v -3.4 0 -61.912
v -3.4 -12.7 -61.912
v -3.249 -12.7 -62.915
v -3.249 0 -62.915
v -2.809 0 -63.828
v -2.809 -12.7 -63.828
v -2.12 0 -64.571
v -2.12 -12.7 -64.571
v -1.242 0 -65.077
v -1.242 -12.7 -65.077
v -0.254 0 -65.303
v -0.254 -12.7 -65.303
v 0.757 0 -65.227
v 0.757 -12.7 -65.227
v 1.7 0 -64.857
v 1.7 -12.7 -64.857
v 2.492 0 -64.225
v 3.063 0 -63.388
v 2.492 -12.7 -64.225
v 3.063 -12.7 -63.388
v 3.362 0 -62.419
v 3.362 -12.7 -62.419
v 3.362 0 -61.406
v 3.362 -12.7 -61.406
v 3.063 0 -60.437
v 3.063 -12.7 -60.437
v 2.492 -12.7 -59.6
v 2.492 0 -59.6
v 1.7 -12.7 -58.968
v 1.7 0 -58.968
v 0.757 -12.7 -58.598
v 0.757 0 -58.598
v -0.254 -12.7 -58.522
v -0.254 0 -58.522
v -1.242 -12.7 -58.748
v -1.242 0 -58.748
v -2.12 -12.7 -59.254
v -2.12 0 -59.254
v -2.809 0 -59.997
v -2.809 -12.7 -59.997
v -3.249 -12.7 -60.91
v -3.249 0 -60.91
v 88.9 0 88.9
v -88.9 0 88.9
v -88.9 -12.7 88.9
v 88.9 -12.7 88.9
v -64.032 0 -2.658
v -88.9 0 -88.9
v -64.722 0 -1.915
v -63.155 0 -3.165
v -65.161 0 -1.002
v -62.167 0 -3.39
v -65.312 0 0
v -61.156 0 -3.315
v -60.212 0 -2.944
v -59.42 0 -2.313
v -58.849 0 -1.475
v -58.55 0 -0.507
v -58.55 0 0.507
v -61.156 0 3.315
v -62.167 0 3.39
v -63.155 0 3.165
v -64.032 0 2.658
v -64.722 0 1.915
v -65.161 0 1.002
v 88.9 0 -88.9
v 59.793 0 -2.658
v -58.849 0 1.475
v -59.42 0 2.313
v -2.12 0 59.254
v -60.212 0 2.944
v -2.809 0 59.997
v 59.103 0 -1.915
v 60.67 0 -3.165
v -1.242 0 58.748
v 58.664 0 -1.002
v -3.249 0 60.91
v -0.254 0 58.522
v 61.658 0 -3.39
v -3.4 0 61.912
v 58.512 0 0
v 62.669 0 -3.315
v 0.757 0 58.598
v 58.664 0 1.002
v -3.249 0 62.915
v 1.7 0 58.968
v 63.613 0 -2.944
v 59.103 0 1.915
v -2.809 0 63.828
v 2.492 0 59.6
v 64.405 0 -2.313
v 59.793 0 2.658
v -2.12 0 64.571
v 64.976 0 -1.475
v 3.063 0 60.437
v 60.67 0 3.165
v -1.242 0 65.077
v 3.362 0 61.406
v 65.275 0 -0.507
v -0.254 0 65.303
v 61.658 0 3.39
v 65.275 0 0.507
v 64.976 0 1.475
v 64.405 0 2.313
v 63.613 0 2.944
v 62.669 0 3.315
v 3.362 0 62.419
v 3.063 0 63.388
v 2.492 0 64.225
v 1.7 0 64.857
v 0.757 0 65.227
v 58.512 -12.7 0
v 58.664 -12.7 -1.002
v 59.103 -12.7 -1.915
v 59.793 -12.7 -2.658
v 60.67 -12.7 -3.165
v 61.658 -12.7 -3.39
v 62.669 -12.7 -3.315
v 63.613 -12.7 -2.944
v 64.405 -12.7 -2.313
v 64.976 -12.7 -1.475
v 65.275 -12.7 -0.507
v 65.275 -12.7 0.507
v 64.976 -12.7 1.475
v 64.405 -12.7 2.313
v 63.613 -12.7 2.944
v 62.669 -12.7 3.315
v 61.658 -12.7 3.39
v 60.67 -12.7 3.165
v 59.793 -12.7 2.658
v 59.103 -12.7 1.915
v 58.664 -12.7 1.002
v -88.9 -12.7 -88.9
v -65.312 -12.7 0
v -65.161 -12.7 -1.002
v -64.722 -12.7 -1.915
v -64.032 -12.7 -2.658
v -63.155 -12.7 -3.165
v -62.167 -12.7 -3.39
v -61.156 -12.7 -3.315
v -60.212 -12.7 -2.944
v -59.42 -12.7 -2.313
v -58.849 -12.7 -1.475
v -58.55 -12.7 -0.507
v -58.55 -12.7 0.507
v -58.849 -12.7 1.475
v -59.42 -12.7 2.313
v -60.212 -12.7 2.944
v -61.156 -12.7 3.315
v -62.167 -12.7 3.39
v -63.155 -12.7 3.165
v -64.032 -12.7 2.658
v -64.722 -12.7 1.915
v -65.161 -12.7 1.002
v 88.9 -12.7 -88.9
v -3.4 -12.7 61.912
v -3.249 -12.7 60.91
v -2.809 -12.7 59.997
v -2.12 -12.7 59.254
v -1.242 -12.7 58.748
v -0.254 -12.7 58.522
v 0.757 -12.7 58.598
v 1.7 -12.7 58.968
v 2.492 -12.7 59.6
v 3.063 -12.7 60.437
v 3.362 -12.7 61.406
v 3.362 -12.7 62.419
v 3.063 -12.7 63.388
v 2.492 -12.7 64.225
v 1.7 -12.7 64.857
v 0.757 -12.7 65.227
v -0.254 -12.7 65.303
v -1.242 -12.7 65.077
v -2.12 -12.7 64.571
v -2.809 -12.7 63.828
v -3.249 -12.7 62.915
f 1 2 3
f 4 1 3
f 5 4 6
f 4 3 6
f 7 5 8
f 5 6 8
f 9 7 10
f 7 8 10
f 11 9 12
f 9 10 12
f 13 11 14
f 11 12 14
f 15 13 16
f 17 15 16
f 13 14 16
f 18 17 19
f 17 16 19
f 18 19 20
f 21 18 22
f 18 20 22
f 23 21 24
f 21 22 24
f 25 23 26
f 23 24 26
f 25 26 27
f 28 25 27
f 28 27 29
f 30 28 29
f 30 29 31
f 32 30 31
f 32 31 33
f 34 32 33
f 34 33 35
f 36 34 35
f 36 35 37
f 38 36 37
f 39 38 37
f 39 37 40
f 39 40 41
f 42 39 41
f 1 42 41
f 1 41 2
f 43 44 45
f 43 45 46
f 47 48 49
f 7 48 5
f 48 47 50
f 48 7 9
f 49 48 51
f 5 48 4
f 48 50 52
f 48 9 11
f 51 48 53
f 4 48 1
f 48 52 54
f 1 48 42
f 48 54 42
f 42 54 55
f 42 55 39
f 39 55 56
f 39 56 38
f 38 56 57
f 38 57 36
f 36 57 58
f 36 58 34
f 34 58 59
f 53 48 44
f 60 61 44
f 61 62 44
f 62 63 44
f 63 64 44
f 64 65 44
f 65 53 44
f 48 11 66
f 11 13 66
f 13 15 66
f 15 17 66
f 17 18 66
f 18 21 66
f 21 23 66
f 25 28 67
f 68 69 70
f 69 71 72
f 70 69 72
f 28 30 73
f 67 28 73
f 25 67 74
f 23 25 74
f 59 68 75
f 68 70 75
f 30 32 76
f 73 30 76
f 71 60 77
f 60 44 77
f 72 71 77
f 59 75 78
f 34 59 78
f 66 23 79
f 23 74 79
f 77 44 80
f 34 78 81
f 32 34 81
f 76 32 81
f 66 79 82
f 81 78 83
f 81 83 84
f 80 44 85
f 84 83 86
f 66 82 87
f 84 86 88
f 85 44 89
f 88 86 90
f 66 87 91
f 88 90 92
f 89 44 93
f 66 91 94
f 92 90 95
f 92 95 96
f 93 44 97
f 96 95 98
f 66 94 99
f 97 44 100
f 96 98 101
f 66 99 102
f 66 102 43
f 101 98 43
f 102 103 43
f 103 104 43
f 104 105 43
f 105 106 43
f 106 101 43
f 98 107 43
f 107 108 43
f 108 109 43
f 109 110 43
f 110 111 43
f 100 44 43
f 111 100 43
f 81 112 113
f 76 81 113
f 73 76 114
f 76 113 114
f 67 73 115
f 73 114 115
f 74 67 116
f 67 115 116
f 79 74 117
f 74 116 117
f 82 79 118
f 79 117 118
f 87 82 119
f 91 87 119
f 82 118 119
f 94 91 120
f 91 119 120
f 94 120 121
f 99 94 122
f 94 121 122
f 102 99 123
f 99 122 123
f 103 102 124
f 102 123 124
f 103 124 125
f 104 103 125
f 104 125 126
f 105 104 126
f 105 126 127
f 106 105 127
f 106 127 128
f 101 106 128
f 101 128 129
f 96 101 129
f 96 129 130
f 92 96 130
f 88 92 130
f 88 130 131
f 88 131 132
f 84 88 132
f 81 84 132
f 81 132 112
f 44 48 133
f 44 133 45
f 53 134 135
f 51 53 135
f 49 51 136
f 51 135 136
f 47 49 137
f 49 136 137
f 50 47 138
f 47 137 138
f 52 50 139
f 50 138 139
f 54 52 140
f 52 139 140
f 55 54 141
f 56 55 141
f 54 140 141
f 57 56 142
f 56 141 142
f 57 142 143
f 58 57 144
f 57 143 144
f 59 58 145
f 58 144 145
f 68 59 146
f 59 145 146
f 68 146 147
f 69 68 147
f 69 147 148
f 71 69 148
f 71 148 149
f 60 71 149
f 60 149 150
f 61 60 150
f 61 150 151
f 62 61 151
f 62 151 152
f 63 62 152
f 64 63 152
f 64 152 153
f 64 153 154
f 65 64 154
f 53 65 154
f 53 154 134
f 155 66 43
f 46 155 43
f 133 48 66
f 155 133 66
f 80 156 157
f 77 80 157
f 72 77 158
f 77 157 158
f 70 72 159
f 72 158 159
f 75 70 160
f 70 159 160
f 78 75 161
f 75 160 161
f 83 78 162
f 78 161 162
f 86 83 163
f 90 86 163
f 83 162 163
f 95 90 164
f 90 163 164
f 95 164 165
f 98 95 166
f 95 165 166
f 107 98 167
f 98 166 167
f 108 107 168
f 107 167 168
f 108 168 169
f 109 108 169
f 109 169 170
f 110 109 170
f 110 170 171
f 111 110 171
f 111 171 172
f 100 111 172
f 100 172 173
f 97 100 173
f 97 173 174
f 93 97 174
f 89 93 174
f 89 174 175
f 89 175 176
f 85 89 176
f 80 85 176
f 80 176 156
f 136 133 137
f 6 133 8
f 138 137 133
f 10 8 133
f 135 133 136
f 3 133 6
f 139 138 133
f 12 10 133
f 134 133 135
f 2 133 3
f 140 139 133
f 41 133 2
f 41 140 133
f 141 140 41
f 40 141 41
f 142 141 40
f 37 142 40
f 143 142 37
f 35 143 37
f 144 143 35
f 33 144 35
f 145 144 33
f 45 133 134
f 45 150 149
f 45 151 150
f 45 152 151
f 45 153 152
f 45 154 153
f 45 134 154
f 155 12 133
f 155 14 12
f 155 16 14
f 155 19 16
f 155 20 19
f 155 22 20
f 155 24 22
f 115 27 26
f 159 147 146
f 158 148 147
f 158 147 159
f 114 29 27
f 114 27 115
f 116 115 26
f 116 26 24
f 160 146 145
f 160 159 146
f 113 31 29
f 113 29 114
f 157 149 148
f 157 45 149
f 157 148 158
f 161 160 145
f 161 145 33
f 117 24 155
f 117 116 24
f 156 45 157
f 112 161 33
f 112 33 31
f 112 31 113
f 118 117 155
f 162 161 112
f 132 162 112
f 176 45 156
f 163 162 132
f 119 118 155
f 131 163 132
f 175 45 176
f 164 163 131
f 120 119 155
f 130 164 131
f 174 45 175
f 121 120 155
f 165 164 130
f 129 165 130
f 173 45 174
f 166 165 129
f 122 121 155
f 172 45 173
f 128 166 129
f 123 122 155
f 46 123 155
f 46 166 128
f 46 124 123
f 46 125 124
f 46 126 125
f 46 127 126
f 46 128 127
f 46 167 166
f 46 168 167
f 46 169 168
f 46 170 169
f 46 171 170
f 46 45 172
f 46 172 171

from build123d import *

# Parameters (mm, degrees)
F0_W     = 177.8
F0_H     = 177.8
F1_DEPTH = 12.7
F2_D     = 6.8


# Not quite as in the source:
# - a length typed as a fraction of an inch, garbled in the dataset ("3 / 203.2 mm" for 3/8 in), is restored


with BuildPart() as f1:
    # F0 (on Front) → F1 (new body)
    with BuildSketch(Plane.XZ):
        with Locations((0, -7.6e-09)):
            Rectangle(F0_W, F0_H)
    extrude(amount=F1_DEPTH)

    # F2 (through all)
    with Locations(Plane(origin=(0, 0, 0), x_dir=(1, 0, 0), z_dir=(0, 1, 0))):
        with Locations((-61.9125, 7.6e-09), (0, -61.9124999924), (61.9125, 7.6e-09), (0, 61.9124999319)):
            Hole(F2_D / 2)


solid = f1.part
